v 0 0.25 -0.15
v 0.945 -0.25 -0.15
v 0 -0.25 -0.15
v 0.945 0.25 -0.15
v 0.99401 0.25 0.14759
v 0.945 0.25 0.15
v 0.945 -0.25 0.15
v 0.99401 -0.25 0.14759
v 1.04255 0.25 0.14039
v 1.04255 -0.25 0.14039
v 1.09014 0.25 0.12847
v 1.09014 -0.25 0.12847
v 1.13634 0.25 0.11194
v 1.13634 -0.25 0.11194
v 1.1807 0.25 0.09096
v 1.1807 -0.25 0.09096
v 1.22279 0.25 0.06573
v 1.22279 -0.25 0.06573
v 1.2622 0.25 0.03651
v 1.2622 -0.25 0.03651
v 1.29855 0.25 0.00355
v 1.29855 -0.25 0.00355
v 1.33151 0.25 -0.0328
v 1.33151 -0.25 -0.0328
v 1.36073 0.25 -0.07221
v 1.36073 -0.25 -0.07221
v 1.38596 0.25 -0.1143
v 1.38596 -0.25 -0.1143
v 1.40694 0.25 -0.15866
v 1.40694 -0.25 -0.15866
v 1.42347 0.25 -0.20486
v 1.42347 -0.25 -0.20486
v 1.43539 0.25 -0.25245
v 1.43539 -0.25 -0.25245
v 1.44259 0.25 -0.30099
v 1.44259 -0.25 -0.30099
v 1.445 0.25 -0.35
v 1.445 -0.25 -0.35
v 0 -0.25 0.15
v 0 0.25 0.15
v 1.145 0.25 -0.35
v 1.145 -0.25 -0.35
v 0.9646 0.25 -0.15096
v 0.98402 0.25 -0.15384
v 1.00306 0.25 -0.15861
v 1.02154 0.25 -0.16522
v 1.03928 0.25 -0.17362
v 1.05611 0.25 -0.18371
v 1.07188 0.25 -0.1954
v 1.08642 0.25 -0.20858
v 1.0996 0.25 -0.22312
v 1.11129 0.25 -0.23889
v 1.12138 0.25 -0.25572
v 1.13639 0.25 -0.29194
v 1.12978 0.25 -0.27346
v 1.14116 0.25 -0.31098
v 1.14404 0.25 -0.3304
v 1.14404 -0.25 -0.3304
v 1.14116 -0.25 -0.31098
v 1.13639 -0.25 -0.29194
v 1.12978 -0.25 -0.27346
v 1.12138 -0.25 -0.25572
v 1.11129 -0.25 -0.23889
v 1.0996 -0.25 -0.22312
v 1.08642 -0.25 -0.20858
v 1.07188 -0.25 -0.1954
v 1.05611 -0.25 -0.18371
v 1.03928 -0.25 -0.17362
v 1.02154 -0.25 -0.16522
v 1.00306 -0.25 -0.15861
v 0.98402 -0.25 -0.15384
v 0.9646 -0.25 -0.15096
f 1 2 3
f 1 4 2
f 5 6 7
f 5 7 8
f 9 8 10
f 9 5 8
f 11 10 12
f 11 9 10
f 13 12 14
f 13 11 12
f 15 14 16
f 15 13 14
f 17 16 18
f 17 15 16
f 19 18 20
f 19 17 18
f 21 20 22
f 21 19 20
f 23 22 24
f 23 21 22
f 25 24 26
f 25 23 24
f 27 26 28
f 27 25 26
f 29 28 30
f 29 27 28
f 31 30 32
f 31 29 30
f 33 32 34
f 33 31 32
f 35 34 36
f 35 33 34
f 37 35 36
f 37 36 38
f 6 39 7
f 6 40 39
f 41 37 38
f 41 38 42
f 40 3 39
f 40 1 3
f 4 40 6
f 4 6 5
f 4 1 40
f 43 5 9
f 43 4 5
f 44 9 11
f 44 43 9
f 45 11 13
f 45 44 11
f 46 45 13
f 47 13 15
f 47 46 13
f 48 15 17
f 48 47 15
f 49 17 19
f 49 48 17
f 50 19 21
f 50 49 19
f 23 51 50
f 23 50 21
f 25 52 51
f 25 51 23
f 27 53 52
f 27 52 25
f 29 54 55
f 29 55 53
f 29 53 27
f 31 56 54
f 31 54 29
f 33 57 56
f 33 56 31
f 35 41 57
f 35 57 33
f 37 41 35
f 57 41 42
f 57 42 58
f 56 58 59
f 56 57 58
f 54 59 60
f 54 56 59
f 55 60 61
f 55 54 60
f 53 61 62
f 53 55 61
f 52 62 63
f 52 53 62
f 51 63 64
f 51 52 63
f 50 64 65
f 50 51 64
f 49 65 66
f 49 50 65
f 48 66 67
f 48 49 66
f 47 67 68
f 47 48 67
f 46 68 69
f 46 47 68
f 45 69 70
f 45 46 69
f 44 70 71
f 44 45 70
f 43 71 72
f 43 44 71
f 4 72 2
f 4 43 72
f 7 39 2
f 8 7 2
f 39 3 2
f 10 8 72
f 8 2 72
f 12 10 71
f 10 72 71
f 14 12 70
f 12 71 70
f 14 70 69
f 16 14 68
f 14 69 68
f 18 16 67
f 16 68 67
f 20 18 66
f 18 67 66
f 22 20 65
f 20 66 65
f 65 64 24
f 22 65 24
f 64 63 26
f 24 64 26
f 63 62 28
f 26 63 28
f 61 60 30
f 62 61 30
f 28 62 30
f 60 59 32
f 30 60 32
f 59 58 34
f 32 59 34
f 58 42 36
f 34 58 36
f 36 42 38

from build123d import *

# Parameters (mm, degrees)
BOSS_EXTRUDE1_DEPTH = 0.25


with BuildPart() as part:
    # Sketch3 → Boss-Extrude1 (new body, symmetric)
    with BuildSketch(Plane(origin=(0, 0, 0), x_dir=(1, 0, 0), z_dir=(0, 1, 0))):
        with BuildLine():
            Line((0, -0.15), (0.945, -0.15))
            ThreePointArc((0.945, -0.15), (1.298553391, -0.003553391), (1.445, 0.35))
            Line((1.445, 0.35), (1.145, 0.35))
            ThreePointArc((1.145, 0.35), (1.086421356, 0.208578644), (0.945, 0.15))
            Line((0.945, 0.15), (0, 0.15))
            Line((0, 0.15), (0, -0.15))
        make_face()
    extrude(amount=BOSS_EXTRUDE1_DEPTH, both=True)


solid = part.part
